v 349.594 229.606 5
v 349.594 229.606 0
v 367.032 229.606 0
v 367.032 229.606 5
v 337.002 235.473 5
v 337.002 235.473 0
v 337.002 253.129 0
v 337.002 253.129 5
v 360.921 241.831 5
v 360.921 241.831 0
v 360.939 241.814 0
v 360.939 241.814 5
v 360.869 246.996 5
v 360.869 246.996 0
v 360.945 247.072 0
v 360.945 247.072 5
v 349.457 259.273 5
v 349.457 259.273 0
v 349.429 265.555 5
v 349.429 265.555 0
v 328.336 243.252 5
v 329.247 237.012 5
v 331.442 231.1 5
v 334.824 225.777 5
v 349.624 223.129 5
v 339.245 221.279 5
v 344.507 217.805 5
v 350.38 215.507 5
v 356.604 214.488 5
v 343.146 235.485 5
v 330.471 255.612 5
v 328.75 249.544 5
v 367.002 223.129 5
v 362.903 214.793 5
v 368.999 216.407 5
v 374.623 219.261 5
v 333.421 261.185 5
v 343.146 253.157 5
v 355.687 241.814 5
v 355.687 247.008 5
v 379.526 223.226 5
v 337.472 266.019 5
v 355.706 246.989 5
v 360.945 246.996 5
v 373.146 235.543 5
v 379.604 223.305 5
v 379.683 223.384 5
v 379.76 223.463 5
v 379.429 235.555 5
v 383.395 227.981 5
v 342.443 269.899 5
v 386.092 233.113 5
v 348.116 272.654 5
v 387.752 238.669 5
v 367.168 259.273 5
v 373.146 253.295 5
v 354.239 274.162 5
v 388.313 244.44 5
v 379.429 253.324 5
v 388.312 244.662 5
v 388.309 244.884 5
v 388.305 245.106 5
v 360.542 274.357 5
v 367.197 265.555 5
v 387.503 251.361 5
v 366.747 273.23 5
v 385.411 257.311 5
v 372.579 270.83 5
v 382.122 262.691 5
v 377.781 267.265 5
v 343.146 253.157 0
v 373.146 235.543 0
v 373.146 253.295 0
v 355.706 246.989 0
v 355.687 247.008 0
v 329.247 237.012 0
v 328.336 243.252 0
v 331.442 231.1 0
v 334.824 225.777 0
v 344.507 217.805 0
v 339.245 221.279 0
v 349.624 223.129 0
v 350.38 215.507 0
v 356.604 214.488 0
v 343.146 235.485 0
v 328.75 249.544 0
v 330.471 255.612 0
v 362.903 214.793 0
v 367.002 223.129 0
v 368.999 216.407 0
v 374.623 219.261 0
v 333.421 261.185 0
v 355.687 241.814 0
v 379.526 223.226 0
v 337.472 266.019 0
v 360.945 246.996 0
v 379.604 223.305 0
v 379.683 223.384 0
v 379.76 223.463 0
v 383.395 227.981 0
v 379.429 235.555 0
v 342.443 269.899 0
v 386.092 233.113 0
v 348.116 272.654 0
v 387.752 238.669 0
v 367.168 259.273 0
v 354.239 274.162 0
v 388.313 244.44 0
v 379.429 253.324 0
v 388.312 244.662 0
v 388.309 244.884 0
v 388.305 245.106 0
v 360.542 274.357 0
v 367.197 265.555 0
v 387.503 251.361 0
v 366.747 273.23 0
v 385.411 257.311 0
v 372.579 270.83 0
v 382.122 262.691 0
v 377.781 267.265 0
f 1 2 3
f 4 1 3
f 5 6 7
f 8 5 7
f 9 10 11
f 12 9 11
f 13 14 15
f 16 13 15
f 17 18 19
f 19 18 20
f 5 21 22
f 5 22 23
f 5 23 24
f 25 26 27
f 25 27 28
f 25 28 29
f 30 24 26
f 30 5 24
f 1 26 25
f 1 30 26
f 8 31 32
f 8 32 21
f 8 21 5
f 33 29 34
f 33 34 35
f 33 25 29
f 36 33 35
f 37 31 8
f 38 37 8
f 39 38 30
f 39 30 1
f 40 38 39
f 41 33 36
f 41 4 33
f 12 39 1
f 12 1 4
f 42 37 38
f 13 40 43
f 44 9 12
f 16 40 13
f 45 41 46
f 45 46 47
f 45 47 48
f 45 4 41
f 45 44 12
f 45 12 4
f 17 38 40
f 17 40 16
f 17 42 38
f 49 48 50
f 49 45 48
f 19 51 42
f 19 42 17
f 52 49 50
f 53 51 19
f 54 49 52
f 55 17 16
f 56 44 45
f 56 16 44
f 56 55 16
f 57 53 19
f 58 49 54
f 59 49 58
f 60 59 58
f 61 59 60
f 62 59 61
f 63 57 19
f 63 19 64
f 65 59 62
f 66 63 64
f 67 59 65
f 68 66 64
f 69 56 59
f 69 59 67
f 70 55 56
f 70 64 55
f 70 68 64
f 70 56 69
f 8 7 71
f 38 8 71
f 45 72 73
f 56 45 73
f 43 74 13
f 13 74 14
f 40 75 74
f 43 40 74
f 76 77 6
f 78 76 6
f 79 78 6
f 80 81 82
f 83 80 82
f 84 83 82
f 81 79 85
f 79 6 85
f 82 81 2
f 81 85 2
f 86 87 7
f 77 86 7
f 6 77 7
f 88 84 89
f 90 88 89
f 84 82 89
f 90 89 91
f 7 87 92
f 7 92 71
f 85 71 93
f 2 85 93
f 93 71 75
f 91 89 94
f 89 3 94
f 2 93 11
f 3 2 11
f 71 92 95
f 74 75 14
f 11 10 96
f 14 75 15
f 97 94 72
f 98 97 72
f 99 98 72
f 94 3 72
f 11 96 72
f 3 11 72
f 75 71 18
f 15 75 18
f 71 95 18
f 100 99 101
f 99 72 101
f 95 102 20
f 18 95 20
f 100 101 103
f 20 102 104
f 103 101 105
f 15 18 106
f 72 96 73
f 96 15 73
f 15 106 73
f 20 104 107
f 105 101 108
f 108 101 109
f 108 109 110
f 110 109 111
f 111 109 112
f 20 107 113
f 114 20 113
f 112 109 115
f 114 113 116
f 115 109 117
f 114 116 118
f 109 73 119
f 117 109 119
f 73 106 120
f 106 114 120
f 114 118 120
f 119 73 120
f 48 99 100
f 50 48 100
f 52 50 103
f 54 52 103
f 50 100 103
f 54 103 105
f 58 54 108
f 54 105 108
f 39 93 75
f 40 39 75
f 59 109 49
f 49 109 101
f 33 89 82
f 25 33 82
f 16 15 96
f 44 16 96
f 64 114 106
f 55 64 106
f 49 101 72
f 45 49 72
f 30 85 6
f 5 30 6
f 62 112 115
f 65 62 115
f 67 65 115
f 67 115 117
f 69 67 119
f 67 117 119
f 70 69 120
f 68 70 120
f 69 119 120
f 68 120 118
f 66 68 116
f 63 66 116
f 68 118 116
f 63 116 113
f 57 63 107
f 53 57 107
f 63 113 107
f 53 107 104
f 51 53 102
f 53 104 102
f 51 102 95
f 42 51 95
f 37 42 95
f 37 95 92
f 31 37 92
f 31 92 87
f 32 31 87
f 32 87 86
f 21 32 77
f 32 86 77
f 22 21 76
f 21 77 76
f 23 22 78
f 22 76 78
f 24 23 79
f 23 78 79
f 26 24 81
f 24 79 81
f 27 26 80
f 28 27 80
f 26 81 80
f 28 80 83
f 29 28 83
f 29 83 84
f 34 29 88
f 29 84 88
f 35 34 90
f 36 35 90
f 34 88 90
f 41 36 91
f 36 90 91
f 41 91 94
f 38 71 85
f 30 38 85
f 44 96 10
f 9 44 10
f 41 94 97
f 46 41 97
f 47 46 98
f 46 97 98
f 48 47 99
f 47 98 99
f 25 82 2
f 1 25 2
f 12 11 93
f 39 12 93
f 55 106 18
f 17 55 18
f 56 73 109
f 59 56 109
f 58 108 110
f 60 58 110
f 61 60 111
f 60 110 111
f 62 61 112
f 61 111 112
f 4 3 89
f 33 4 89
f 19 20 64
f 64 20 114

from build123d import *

# Parameters (mm, degrees)
F1_DEPTH = 5


with BuildPart() as f1:
    # F0 (on Top) → F1 (new body)
    with BuildSketch(Plane.XY):
        with BuildLine():
            ThreePointArc((379.525959, 223.226488), (379.643478, 223.344661), (379.760338, 223.463485))
            Line((379.760338, 223.463485), (379.428555, 223.323892))
            Line((379.428555, 223.323892), (379.525959, 223.226488))
        make_face()
        with BuildLine():
            ThreePointArc((379.760338, 223.463485), (386.092492, 233.113339), (388.312756, 244.439691))
            ThreePointArc((388.312756, 244.439691), (388.310904, 244.773005), (388.305349, 245.106277))
            ThreePointArc((388.305349, 245.106277), (330.470527, 255.611544), (379.525959, 223.226488))
            Line((379.525959, 223.226488), (379.428555, 223.323892))
            Line((379.428555, 223.323892), (379.760338, 223.463485))
        make_face()
        Polygon((337.001699, 235.473338), (337.001699, 253.128634), (343.146089, 253.156912), (343.146089, 250.818692), (343.146089, 250.623444), (343.146089, 235.485236), align=None, mode=Mode.SUBTRACT)
        Polygon((349.594001, 229.606358), (367.031511, 229.606358), (367.001699, 223.128634), (349.623813, 223.128634), align=None, mode=Mode.SUBTRACT)
        Polygon((373.146089, 235.543326), (373.146089, 253.294979), (379.428555, 253.323892), (379.428555, 235.555491), align=None, mode=Mode.SUBTRACT)
        Polygon((360.944925, 246.99601), (360.921156, 241.831291), (360.938548, 241.813899), (360.921076, 241.813899), (355.686963, 241.813899), (355.686963, 246.989038), (355.686963, 247.007774), (355.706094, 246.989064), (360.868974, 246.99591), (360.945276, 247.072211), align=None, mode=Mode.SUBTRACT)
        Polygon((367.168043, 259.273024), (349.457468, 259.273024), (349.428555, 265.555491), (367.196957, 265.555491), align=None, mode=Mode.SUBTRACT)
    extrude(amount=F1_DEPTH)


solid = f1.part
